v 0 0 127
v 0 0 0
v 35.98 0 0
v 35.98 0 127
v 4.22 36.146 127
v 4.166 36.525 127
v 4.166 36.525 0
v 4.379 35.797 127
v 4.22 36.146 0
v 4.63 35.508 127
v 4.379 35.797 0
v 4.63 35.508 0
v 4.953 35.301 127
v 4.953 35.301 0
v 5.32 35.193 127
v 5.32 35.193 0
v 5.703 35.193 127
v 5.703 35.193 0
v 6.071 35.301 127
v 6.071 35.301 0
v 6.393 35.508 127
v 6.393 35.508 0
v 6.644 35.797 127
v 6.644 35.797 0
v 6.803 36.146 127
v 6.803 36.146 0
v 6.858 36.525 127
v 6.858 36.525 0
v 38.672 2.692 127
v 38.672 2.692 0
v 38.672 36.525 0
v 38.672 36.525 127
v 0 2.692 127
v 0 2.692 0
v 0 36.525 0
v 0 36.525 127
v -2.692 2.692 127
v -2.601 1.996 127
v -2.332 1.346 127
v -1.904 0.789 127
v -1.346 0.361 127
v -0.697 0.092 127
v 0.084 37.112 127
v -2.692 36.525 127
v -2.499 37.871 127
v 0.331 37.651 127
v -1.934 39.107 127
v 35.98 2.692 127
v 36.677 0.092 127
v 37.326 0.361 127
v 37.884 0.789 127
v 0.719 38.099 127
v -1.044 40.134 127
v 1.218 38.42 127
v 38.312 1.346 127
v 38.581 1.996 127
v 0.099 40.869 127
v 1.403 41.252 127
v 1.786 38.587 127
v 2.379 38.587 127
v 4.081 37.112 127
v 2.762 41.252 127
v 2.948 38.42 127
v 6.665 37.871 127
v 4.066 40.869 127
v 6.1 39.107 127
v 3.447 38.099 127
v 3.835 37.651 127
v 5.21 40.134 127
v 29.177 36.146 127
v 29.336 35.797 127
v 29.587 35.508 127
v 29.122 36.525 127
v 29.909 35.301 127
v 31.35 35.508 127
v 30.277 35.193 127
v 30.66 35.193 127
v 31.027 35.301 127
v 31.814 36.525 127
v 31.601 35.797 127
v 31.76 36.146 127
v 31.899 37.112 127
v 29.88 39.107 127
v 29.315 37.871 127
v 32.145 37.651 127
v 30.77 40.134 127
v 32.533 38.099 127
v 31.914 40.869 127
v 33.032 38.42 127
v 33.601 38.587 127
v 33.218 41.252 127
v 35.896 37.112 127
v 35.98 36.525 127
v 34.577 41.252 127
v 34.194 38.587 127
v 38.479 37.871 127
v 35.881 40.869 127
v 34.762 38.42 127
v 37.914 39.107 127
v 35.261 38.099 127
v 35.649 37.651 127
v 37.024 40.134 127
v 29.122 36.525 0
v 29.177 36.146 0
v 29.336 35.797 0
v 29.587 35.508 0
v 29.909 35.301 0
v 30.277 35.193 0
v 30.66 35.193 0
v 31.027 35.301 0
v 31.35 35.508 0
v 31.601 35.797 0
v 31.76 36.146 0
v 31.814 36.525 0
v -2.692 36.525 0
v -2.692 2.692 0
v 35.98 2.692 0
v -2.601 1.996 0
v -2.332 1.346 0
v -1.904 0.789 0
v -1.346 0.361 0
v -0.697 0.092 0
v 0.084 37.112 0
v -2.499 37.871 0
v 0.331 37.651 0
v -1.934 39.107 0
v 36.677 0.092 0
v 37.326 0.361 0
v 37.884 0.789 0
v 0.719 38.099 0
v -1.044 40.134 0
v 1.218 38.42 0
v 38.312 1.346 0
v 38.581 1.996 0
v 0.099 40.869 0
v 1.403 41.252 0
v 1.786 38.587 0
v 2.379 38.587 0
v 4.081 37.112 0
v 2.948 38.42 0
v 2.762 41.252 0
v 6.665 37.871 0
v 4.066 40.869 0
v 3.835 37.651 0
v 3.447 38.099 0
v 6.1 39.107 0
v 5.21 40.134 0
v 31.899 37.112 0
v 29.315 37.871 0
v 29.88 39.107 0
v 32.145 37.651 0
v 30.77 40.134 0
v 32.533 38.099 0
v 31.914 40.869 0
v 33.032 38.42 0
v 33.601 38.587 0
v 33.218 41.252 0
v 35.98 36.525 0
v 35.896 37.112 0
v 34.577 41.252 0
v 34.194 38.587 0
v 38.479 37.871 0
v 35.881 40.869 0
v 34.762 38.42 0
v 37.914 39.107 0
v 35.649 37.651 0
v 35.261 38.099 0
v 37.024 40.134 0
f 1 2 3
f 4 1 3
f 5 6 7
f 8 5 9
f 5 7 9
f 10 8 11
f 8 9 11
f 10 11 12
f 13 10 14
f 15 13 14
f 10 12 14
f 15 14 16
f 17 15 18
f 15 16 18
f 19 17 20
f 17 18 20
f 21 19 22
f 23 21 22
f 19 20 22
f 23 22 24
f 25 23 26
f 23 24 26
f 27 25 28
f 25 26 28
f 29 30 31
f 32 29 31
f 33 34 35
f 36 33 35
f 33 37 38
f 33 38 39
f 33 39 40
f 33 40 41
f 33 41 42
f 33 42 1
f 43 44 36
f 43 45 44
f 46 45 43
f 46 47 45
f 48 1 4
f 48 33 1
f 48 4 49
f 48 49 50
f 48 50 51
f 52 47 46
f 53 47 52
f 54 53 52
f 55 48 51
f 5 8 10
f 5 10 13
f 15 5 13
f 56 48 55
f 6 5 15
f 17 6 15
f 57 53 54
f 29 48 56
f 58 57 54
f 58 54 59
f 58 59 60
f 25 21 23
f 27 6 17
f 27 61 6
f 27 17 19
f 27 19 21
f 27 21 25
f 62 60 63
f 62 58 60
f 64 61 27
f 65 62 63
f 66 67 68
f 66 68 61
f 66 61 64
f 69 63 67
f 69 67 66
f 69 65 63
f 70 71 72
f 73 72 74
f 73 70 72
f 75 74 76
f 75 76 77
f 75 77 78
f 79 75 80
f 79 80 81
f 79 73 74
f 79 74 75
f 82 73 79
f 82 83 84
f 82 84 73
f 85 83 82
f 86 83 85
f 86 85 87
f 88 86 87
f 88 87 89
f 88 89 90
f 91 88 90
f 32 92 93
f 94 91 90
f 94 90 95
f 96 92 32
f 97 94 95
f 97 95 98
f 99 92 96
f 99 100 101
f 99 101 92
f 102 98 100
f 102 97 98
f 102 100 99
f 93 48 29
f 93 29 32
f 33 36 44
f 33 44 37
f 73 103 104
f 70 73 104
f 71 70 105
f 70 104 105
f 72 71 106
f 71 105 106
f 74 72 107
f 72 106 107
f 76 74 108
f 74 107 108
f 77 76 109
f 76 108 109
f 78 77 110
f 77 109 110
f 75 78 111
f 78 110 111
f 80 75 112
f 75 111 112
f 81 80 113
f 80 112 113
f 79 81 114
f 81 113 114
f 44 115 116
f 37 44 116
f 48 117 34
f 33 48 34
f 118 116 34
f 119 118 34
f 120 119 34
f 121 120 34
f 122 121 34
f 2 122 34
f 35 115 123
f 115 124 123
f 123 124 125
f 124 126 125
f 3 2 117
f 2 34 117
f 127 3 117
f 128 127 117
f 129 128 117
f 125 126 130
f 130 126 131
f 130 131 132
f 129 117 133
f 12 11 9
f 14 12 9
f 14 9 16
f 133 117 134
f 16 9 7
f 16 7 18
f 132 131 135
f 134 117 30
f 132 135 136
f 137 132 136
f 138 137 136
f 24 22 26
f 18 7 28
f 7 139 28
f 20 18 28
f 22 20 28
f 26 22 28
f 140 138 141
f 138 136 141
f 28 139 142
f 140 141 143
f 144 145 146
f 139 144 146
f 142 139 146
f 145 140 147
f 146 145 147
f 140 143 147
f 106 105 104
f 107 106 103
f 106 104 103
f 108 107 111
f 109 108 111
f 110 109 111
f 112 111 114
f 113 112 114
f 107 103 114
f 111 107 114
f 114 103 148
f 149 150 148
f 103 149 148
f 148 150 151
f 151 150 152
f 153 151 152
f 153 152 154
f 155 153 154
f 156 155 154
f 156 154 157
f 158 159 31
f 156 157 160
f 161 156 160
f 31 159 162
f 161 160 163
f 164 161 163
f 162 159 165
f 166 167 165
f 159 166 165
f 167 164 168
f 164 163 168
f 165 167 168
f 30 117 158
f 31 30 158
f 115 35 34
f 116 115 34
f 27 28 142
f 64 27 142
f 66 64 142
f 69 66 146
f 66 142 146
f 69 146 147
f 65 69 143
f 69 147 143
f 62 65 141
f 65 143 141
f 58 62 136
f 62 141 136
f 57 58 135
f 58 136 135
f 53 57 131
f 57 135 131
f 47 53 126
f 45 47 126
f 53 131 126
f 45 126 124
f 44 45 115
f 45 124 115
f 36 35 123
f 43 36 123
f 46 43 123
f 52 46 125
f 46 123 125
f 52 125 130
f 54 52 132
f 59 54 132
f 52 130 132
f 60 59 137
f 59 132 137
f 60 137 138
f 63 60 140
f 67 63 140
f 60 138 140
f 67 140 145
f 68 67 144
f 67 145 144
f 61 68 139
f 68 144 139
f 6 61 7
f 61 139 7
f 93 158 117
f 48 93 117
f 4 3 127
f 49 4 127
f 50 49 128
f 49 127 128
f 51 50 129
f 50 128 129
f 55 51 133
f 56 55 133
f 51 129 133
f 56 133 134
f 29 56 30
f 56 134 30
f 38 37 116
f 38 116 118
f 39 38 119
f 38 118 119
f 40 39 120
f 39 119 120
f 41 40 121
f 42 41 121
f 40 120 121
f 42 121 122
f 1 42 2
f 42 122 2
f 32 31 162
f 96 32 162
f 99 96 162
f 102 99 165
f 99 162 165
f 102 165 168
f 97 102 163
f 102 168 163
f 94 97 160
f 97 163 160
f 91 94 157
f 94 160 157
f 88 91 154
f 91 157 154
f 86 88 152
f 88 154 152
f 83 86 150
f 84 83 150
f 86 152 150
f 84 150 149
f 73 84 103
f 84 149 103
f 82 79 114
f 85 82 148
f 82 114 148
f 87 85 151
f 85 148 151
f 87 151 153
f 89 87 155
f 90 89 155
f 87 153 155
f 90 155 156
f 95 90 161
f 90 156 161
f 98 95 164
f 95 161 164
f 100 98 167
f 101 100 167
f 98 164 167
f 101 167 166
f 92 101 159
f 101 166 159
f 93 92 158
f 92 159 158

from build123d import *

# Parameters (mm, degrees)
BOSS_EXTRUDE1_DEPTH = 127


with BuildPart() as part:
    # Sketch1 → Boss-Extrude1 (new body)
    with BuildSketch(Plane.XY):
        with BuildLine():
            Line((0, 0), (35.98, 0))
            ThreePointArc((35.98, 0), (37.883814298, 0.788585702), (38.6724, 2.6924))
            Line((38.6724, 2.6924), (38.6724, 36.5252))
            ThreePointArc((38.6724, 36.5252), (33.8972, 41.3004), (29.122, 36.5252))
            ThreePointArc((29.122, 36.5252), (30.4682, 35.179), (31.8144, 36.5252))
            ThreePointArc((31.8144, 36.5252), (33.8972, 38.608), (35.98, 36.5252))
            Line((35.98, 36.5252), (35.98, 2.6924))
            Line((35.98, 2.6924), (0, 2.6924))
            Line((0, 2.6924), (0, 36.5252))
            ThreePointArc((0, 36.5252), (2.0828, 38.608), (4.1656, 36.5252))
            ThreePointArc((4.1656, 36.5252), (5.5118, 35.179), (6.858, 36.5252))
            ThreePointArc((6.858, 36.5252), (2.0828, 41.3004), (-2.6924, 36.5252))
            Line((-2.6924, 36.5252), (-2.6924, 2.6924))
            ThreePointArc((-2.6924, 2.6924), (-1.903814298, 0.788585702), (0, 0))
        make_face()
    extrude(amount=BOSS_EXTRUDE1_DEPTH)


solid = part.part
